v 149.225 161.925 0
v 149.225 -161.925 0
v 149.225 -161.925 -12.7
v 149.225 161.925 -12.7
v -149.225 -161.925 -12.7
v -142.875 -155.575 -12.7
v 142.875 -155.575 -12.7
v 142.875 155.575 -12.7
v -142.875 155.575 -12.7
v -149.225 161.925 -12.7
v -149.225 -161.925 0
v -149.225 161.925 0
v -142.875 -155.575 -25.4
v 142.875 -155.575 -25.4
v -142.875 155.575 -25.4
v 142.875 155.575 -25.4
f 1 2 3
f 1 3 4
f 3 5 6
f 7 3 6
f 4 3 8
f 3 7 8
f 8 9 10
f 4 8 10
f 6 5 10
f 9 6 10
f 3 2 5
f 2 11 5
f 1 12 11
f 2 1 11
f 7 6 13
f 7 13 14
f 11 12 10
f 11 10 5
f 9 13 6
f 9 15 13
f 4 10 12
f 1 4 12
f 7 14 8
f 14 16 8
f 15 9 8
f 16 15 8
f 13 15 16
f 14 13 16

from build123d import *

# Parameters (mm, degrees)
F0_W     = 285.75
F0_H     = 311.15
F1_DEPTH = 25.4
F3_W     = 285.75
F3_H     = 12.7
F4_DEPTH = 6.35
F2_W     = 285.75
F2_H     = 12.7
F5_DEPTH = 6.35
F8_DEPTH = 6.35
F9_DEPTH = 6.35


with BuildPart() as f1:
    # F0 (on Top) → F1 (new body)
    with BuildSketch(Plane.XY):
        Rectangle(F0_W, F0_H)
    extrude(amount=-F1_DEPTH)

    # F3 (on face) → F4 (join)
    with BuildSketch(Plane(origin=(0, 155.575, 0), x_dir=(-1, 0, 0), z_dir=(0, 1, 0))):
        with Locations((0, -6.35)):
            Rectangle(F3_W, F3_H)
    extrude(amount=F4_DEPTH)

    # F2 (on face) → F5 (join)
    with BuildSketch(Plane.XZ.offset(155.575)):
        with Locations((0, -6.35)):
            Rectangle(F2_W, F2_H)
    extrude(amount=F5_DEPTH)

    # F7 (on face) → F8 (join)
    with BuildSketch(Plane(origin=(-142.875, 0, 0), x_dir=(0, -1, 0), z_dir=(-1, 0, 0))):
        Polygon((161.925, 0), (-161.925, 0), (-161.925, -12.7), (-155.575, -12.7), (155.575, -12.7), (161.925, -12.7), align=None)
    extrude(amount=F8_DEPTH)

    # F6 (on face) → F9 (join)
    with BuildSketch(Plane.YZ.offset(142.875)):
        Polygon((161.925, 0), (-161.925, 0), (-161.925, -12.7), (-155.575, -12.7), (155.575, -12.7), (161.925, -12.7), align=None)
    extrude(amount=F9_DEPTH)


solid = f1.part
